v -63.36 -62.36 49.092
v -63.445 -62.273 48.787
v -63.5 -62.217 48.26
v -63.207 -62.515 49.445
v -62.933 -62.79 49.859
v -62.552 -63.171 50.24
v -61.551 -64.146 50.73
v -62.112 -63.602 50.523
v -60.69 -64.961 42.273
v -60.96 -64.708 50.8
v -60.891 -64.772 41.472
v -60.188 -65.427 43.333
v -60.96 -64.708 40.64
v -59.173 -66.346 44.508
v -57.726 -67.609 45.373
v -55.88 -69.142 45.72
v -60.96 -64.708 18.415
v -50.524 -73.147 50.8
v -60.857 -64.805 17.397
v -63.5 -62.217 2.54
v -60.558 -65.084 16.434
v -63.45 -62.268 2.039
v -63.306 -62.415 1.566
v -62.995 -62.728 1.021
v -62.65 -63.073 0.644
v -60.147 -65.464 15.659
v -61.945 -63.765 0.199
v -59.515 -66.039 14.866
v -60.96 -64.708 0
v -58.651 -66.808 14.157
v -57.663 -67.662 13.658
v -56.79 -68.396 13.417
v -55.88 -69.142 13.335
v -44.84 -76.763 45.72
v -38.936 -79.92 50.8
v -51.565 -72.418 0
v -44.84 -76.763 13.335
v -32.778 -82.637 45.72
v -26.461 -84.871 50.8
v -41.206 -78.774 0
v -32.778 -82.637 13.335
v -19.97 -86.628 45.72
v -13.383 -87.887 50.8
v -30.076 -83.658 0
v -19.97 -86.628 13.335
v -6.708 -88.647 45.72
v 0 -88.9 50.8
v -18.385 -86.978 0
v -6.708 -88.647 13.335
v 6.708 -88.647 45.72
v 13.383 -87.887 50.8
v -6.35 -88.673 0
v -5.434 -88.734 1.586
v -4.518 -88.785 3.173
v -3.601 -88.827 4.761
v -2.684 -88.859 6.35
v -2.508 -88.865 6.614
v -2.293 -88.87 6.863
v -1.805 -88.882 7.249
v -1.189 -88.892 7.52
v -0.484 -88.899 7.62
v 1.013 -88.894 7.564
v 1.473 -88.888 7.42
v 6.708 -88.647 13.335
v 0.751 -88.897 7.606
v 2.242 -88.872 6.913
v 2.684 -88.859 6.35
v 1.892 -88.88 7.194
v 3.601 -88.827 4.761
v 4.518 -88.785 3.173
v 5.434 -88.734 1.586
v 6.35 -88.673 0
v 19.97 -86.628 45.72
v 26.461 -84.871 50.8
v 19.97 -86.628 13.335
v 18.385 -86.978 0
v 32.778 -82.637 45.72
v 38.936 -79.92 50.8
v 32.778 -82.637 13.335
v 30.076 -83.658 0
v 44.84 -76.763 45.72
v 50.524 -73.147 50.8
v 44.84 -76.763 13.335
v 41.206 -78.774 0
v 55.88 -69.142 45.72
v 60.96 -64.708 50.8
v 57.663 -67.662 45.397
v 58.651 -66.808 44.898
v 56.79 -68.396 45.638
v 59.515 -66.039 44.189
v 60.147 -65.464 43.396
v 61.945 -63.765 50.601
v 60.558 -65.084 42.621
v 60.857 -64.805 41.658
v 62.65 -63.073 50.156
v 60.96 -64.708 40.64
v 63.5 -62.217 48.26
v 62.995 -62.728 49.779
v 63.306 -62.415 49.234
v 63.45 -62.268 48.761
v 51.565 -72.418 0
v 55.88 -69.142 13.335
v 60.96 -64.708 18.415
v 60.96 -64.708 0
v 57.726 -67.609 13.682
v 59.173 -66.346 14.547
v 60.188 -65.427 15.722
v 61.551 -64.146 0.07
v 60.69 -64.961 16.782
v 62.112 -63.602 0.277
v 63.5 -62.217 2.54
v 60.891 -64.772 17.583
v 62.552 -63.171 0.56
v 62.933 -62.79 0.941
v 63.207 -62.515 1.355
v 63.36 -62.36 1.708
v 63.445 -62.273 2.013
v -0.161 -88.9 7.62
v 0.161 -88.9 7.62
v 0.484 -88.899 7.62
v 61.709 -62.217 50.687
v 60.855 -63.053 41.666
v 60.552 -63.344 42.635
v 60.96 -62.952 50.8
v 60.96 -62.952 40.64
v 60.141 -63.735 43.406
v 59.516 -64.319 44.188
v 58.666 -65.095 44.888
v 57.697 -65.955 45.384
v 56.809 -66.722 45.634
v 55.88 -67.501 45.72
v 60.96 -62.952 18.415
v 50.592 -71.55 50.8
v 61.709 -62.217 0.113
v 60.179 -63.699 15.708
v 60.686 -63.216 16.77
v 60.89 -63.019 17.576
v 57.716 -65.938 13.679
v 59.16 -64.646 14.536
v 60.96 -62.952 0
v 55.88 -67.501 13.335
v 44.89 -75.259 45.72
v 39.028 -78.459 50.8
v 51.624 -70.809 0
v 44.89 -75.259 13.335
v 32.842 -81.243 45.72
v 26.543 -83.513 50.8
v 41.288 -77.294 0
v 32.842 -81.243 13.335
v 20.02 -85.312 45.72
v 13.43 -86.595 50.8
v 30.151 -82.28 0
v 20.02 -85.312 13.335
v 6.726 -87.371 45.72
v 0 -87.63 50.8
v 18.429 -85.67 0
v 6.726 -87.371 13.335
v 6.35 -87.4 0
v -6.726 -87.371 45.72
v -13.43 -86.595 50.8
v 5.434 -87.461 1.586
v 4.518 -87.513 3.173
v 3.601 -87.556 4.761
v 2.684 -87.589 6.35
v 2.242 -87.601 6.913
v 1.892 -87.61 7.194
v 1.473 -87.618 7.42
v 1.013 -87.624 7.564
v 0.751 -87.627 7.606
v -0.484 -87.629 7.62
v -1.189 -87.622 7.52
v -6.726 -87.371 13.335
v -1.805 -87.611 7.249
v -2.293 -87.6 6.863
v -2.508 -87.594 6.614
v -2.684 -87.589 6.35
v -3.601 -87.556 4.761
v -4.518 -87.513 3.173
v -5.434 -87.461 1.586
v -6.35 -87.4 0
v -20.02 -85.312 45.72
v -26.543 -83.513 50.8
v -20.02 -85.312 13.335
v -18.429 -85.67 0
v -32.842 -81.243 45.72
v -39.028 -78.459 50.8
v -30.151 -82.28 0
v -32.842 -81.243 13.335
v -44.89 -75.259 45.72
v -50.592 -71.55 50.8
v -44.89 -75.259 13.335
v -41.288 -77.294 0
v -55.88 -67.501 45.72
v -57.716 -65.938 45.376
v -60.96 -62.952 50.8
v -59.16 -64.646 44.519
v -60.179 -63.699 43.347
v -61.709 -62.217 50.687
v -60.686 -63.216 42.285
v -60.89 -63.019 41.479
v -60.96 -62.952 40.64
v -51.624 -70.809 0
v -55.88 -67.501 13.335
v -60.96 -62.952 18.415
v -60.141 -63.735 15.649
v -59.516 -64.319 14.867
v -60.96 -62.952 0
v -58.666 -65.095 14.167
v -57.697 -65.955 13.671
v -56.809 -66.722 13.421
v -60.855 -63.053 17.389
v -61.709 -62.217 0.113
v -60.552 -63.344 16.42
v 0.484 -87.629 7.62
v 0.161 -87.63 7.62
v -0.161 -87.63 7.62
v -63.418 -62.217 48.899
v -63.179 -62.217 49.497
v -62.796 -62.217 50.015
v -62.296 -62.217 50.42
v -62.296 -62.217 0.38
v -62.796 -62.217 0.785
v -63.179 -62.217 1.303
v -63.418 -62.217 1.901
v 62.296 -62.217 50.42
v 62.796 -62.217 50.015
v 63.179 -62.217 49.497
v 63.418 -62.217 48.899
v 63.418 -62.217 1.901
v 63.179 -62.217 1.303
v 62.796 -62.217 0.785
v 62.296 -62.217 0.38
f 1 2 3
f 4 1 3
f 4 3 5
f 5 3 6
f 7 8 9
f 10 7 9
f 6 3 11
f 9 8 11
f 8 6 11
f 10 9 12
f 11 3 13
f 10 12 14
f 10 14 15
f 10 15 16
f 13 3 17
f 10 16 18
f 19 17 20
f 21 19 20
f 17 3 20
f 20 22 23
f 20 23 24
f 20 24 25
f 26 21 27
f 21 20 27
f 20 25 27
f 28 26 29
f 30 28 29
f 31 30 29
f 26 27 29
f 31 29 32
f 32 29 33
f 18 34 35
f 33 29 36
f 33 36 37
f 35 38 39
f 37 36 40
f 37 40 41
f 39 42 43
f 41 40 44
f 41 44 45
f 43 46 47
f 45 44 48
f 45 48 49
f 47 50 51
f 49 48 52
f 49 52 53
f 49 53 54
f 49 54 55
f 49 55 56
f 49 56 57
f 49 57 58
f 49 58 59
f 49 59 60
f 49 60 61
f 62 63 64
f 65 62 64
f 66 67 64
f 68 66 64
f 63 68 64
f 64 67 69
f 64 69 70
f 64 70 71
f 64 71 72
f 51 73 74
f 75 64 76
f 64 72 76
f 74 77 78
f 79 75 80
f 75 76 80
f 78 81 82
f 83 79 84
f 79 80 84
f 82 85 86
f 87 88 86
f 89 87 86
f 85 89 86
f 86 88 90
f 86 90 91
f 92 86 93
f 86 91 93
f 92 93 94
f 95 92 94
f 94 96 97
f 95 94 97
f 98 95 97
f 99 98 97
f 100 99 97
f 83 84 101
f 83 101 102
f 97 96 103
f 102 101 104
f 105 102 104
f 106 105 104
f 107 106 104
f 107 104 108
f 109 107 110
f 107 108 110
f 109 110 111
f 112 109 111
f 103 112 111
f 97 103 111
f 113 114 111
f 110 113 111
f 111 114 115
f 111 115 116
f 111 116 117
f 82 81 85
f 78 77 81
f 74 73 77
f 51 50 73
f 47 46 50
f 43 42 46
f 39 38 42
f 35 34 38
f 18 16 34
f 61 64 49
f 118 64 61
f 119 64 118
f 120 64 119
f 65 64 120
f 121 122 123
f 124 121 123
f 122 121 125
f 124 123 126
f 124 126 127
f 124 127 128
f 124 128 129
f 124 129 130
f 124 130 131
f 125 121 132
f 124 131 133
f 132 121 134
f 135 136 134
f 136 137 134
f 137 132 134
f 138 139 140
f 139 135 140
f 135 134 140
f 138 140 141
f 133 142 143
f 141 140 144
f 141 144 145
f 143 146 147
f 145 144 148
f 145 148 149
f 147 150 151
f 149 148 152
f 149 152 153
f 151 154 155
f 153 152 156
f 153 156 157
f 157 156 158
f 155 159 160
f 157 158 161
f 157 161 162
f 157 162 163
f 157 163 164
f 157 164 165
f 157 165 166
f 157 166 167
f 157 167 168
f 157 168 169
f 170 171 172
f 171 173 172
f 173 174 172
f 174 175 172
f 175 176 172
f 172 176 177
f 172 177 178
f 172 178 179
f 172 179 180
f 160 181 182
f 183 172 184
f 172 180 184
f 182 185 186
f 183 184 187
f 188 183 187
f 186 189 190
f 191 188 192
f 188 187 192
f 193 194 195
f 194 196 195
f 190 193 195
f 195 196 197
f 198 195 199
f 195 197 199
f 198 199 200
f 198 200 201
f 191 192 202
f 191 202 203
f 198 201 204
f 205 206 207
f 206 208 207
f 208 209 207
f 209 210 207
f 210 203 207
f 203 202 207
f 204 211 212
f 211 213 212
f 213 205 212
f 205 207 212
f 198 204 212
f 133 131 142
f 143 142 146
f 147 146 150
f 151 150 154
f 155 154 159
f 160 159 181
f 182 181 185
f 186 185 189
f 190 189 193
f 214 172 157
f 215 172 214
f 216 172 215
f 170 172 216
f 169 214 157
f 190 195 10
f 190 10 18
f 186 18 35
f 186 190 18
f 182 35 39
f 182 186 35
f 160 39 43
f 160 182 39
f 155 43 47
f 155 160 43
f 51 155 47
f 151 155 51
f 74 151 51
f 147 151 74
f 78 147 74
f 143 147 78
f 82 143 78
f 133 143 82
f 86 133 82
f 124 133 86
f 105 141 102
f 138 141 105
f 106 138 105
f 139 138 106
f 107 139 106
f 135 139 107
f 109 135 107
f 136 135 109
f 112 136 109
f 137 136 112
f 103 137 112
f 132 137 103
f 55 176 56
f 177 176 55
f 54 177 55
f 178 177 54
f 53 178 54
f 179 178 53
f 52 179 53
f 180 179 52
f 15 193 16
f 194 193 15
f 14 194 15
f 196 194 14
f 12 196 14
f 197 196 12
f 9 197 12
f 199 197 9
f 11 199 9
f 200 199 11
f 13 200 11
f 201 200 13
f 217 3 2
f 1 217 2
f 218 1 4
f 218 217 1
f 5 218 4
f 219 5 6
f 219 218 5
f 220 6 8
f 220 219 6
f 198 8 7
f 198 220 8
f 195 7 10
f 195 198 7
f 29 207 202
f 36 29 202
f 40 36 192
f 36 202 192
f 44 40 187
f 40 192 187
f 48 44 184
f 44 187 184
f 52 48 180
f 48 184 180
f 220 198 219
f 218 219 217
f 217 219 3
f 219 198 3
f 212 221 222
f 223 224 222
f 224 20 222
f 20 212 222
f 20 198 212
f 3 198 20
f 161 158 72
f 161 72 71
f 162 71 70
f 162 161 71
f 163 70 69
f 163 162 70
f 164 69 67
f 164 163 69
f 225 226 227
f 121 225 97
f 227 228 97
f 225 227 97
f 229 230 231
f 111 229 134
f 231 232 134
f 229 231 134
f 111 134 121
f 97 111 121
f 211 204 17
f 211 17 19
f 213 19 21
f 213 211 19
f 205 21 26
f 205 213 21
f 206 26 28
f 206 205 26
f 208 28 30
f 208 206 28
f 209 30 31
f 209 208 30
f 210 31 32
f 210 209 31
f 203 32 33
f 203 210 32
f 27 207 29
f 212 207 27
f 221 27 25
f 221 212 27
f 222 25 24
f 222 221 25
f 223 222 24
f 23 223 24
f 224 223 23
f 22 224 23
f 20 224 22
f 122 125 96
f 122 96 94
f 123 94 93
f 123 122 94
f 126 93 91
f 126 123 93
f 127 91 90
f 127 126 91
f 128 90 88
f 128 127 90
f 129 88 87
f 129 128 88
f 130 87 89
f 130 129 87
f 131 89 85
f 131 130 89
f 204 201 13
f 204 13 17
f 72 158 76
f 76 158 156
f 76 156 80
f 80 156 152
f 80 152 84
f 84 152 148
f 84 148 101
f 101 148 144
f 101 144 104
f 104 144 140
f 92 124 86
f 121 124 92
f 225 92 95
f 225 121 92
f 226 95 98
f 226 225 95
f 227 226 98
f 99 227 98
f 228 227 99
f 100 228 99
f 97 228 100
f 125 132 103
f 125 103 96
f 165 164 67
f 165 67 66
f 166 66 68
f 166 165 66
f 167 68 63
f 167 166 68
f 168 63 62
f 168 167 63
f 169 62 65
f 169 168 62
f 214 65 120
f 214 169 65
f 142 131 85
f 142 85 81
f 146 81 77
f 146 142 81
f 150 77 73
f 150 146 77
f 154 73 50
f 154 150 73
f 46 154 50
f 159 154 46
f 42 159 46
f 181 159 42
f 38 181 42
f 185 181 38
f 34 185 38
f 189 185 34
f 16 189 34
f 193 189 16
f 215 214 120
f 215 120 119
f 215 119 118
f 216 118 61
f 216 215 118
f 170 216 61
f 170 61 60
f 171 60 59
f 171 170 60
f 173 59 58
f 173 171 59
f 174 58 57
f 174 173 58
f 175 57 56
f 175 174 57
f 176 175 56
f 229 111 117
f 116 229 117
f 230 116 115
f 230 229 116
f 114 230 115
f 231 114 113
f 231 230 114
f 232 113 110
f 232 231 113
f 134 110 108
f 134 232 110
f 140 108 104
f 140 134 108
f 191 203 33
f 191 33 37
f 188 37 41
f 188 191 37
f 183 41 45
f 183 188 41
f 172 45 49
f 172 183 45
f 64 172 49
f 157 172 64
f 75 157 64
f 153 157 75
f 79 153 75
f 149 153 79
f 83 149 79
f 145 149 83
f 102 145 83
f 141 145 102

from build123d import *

# Parameters (mm, degrees)
F1_DEPTH = 63.5
F3_DEPTH = 127


with BuildPart() as f1:
    # F0 (on Top) → F1 (new body)
    with BuildSketch(Plane.XY):
        with BuildLine():
            Line((-61.709456, -62.217039), (-63.5, -62.217039))
            ThreePointArc((-63.5, -62.217039), (0, -88.9), (63.5, -62.217039))
            Line((63.5, -62.217039), (61.709456, -62.217039))
            ThreePointArc((61.709456, -62.217039), (0, -87.63), (-61.709456, -62.217039))
        make_face()
    extrude(amount=F1_DEPTH)

    # F2 (on Front) → F3 (cut)
    with BuildSketch(Plane.XZ):
        with BuildLine():
            ThreePointArc((-63.5, 48.26), (-62.756051, 50.056051), (-60.96, 50.8))
            Line((-60.96, 50.8), (60.96, 50.8))
            ThreePointArc((60.96, 50.8), (62.756051, 50.056051), (63.5, 48.26))
            Line((63.5, 48.26), (63.5, 63.5))
            Line((63.5, 63.5), (-63.5, 63.5))
            Line((-63.5, 63.5), (-63.5, 48.26))
        make_face()
        with BuildLine():
            Line((55.88, 45.72), (-55.88, 45.72))
            ThreePointArc((-55.88, 45.72), (-59.472102, 44.232102), (-60.96, 40.64))
            Line((-60.96, 40.64), (-60.96, 18.415))
            ThreePointArc((-60.96, 18.415), (-59.472102, 14.822898), (-55.88, 13.335))
            Line((-55.88, 13.335), (55.88, 13.335))
            ThreePointArc((55.88, 13.335), (59.472102, 14.822898), (60.96, 18.415))
            Line((60.96, 18.415), (60.96, 40.64))
            ThreePointArc((60.96, 40.64), (59.472102, 44.232102), (55.88, 45.72))
        make_face()
        with BuildLine():
            Line((63.5, 0), (63.5, 2.54))
            ThreePointArc((63.5, 2.54), (62.756051, 0.743949), (60.96, 0))
            Line((60.96, 0), (63.5, 0))
        make_face()
        with BuildLine():
            Line((-2.683826, 6.35), (-6.35, 0))
            Line((-6.35, 0), (6.35, 0))
            Line((6.35, 0), (2.683826, 6.35))
            ThreePointArc((2.683826, 6.35), (1.754121, 7.279705), (0.484121, 7.62))
            Line((0.484121, 7.62), (-0.484121, 7.62))
            ThreePointArc((-0.484121, 7.62), (-1.754121, 7.279705), (-2.683826, 6.35))
        make_face()
        with BuildLine():
            ThreePointArc((-60.96, 0), (-62.756051, 0.743949), (-63.5, 2.54))
            Line((-63.5, 2.54), (-63.5, 0))
            Line((-63.5, 0), (-60.96, 0))
        make_face()
    extrude(amount=F3_DEPTH, mode=Mode.SUBTRACT)


solid = f1.part
